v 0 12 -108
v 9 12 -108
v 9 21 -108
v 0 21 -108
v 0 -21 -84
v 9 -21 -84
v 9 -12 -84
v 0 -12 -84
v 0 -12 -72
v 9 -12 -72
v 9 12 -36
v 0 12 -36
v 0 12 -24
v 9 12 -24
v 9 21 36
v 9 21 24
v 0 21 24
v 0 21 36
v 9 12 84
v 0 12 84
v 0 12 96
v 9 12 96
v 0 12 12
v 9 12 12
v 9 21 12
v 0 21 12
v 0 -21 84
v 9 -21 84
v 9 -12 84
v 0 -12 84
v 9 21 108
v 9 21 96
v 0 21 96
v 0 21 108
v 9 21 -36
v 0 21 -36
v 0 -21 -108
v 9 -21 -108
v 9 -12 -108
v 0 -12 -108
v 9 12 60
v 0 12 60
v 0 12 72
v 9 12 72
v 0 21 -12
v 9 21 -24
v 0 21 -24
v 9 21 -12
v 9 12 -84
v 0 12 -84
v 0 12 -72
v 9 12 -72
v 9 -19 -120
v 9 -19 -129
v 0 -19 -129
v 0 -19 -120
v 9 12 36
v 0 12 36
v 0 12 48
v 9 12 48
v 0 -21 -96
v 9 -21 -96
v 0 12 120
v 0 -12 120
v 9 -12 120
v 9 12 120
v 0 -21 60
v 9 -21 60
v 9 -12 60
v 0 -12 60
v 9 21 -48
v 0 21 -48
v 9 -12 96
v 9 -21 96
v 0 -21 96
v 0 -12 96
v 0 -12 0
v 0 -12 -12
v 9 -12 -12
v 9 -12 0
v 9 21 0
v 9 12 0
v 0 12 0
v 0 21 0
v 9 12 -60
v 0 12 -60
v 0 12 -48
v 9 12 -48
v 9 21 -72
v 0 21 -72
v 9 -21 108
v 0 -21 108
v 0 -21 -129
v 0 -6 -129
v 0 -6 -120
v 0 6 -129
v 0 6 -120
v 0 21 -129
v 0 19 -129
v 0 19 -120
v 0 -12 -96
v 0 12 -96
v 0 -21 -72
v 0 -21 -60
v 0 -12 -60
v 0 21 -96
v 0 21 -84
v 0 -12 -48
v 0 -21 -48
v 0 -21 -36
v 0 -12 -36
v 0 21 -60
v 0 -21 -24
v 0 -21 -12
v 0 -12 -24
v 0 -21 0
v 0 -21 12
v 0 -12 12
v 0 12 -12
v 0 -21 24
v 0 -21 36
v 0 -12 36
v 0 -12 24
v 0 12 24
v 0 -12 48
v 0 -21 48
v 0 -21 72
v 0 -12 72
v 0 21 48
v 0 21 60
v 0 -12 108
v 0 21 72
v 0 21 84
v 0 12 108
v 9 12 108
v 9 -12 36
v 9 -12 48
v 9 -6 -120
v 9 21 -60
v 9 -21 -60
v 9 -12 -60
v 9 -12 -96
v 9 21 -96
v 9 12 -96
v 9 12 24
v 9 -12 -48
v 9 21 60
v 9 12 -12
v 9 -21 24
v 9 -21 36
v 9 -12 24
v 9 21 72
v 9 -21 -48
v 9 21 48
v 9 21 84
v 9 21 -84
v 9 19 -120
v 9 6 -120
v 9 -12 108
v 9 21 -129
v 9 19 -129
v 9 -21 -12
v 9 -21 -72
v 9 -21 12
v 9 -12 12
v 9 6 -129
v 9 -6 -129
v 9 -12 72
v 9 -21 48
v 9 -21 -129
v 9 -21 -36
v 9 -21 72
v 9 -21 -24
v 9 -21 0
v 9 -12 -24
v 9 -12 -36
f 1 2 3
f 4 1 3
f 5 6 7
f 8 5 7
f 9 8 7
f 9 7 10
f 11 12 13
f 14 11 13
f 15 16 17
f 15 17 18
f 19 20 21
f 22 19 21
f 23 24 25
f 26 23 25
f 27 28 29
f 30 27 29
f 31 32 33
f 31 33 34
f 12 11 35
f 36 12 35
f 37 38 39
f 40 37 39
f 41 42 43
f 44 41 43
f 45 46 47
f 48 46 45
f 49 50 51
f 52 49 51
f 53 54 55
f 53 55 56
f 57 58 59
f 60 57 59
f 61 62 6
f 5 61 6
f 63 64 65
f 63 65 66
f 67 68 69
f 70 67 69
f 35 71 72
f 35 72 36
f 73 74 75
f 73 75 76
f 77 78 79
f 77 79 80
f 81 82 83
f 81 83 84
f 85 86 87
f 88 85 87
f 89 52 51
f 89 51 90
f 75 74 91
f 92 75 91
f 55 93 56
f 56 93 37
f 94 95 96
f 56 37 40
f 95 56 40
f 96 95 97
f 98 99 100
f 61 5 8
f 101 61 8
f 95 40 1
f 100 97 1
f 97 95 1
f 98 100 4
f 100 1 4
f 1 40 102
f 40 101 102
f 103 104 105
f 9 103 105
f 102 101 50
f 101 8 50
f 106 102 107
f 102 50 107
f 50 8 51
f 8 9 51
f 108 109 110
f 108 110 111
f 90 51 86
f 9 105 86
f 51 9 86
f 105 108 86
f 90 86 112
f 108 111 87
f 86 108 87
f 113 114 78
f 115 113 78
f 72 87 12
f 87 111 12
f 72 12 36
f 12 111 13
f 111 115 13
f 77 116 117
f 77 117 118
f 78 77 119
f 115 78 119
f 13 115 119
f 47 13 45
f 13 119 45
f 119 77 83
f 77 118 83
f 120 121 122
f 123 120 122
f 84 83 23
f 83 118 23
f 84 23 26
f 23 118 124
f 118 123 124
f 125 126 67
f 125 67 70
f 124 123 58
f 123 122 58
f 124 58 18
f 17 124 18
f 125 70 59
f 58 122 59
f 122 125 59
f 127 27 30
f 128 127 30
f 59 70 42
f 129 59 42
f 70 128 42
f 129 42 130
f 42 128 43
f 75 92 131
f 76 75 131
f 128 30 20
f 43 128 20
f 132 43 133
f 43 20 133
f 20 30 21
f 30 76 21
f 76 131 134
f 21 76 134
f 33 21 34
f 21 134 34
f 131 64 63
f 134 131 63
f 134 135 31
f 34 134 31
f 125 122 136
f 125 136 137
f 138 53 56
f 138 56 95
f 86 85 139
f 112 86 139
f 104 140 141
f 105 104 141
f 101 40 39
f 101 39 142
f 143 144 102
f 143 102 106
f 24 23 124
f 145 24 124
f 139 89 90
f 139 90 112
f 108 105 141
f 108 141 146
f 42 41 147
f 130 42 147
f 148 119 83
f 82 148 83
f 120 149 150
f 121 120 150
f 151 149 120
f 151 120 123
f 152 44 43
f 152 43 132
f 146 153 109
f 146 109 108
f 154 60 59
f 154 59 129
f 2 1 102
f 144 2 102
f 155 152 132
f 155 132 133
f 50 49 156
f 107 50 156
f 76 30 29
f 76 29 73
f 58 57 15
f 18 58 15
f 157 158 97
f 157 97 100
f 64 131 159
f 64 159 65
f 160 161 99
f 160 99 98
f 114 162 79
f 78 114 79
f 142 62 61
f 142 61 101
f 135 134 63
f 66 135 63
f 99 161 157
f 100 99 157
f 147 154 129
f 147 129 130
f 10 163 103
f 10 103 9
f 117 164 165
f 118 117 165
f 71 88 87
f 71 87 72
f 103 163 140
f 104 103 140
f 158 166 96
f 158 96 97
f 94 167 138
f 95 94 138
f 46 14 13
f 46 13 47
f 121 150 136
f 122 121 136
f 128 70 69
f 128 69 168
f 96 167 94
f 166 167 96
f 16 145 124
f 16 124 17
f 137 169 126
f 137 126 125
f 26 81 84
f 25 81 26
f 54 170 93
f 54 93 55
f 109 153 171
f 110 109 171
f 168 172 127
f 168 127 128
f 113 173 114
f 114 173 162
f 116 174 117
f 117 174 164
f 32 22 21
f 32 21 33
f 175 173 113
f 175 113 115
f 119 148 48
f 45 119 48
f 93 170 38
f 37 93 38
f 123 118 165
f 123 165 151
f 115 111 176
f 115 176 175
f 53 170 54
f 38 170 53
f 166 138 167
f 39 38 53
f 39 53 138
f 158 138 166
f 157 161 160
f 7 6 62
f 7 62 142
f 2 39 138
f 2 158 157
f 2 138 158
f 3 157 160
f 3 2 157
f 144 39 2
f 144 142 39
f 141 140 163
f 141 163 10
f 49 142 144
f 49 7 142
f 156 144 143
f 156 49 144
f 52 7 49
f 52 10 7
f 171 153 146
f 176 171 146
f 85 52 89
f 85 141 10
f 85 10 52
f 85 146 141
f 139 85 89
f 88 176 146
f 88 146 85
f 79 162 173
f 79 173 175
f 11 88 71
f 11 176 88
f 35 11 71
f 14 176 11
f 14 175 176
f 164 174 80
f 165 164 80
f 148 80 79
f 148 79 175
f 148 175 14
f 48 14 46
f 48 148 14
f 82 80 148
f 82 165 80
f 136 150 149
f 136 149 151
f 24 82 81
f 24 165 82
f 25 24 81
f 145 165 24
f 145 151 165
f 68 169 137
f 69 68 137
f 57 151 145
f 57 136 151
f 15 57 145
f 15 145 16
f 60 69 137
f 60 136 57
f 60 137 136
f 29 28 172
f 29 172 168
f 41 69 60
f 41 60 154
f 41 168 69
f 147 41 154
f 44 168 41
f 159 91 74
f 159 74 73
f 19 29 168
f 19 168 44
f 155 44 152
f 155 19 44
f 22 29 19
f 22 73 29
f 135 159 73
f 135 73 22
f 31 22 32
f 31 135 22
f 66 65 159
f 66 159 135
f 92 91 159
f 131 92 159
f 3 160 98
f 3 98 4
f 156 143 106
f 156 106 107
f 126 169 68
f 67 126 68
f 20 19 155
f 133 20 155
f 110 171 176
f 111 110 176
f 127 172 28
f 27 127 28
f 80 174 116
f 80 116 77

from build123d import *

# Parameters (mm, degrees)
F0_W     = 24
F0_H     = 240
F1_DEPTH = 9
F2_W     = 9
F2_H     = 12
F3_DEPTH = 9
F4_W     = 12
F4_H     = 9
F4_W_2   = 2
F5_DEPTH = 9


with BuildPart() as f1:
    # F0 (on Right) → F1 (new body)
    with BuildSketch(Plane.YZ):
        Rectangle(F0_W, F0_H)
    extrude(amount=F1_DEPTH)

    # F2 (on face) → F3 (join, through all)
    with BuildSketch(Plane.YZ.offset(9)):
        with Locations((-16.5, -114)):
            Rectangle(F2_W, F2_H)
        with Locations((-16.5, -90)):
            Rectangle(F2_W, F2_H)
        with Locations((-16.5, -66)):
            Rectangle(F2_W, F2_H)
        with Locations((-16.5, -42)):
            Rectangle(F2_W, F2_H)
        with Locations((-16.5, -18)):
            Rectangle(F2_W, F2_H)
        with Locations((-16.5, 6)):
            Rectangle(F2_W, F2_H)
        with Locations((-16.5, 30)):
            Rectangle(F2_W, F2_H)
        with Locations((-16.5, 54)):
            Rectangle(F2_W, F2_H)
        with Locations((-16.5, 78)):
            Rectangle(F2_W, F2_H)
        with Locations((-16.5, 102)):
            Rectangle(F2_W, F2_H)
        with Locations((16.5, -90)):
            Rectangle(F2_W, F2_H)
        with Locations((16.5, 30)):
            Rectangle(F2_W, F2_H)
        with Locations((16.5, 102)):
            Rectangle(F2_W, F2_H)
        with Locations((16.5, -18)):
            Rectangle(F2_W, F2_H)
        with Locations((16.5, 78)):
            Rectangle(F2_W, F2_H)
        with Locations((16.5, 6)):
            Rectangle(F2_W, F2_H)
        with Locations((16.5, 54)):
            Rectangle(F2_W, F2_H)
        with Locations((16.5, -42)):
            Rectangle(F2_W, F2_H)
        with Locations((16.5, -66)):
            Rectangle(F2_W, F2_H)
        with Locations((16.5, -114)):
            Rectangle(F2_W, F2_H)
    extrude(amount=-F3_DEPTH)

    # F4 (on face) → F5 (join, through all)
    with BuildSketch(Plane.YZ.offset(9)):
        with Locations((0, -124.5)):
            Rectangle(F4_W, F4_H)
        with Locations((20, -124.5)):
            Rectangle(F4_W_2, F4_H)
        with Locations((-20, -124.5)):
            Rectangle(F4_W_2, F4_H)
    extrude(amount=-F5_DEPTH)


solid = f1.part
